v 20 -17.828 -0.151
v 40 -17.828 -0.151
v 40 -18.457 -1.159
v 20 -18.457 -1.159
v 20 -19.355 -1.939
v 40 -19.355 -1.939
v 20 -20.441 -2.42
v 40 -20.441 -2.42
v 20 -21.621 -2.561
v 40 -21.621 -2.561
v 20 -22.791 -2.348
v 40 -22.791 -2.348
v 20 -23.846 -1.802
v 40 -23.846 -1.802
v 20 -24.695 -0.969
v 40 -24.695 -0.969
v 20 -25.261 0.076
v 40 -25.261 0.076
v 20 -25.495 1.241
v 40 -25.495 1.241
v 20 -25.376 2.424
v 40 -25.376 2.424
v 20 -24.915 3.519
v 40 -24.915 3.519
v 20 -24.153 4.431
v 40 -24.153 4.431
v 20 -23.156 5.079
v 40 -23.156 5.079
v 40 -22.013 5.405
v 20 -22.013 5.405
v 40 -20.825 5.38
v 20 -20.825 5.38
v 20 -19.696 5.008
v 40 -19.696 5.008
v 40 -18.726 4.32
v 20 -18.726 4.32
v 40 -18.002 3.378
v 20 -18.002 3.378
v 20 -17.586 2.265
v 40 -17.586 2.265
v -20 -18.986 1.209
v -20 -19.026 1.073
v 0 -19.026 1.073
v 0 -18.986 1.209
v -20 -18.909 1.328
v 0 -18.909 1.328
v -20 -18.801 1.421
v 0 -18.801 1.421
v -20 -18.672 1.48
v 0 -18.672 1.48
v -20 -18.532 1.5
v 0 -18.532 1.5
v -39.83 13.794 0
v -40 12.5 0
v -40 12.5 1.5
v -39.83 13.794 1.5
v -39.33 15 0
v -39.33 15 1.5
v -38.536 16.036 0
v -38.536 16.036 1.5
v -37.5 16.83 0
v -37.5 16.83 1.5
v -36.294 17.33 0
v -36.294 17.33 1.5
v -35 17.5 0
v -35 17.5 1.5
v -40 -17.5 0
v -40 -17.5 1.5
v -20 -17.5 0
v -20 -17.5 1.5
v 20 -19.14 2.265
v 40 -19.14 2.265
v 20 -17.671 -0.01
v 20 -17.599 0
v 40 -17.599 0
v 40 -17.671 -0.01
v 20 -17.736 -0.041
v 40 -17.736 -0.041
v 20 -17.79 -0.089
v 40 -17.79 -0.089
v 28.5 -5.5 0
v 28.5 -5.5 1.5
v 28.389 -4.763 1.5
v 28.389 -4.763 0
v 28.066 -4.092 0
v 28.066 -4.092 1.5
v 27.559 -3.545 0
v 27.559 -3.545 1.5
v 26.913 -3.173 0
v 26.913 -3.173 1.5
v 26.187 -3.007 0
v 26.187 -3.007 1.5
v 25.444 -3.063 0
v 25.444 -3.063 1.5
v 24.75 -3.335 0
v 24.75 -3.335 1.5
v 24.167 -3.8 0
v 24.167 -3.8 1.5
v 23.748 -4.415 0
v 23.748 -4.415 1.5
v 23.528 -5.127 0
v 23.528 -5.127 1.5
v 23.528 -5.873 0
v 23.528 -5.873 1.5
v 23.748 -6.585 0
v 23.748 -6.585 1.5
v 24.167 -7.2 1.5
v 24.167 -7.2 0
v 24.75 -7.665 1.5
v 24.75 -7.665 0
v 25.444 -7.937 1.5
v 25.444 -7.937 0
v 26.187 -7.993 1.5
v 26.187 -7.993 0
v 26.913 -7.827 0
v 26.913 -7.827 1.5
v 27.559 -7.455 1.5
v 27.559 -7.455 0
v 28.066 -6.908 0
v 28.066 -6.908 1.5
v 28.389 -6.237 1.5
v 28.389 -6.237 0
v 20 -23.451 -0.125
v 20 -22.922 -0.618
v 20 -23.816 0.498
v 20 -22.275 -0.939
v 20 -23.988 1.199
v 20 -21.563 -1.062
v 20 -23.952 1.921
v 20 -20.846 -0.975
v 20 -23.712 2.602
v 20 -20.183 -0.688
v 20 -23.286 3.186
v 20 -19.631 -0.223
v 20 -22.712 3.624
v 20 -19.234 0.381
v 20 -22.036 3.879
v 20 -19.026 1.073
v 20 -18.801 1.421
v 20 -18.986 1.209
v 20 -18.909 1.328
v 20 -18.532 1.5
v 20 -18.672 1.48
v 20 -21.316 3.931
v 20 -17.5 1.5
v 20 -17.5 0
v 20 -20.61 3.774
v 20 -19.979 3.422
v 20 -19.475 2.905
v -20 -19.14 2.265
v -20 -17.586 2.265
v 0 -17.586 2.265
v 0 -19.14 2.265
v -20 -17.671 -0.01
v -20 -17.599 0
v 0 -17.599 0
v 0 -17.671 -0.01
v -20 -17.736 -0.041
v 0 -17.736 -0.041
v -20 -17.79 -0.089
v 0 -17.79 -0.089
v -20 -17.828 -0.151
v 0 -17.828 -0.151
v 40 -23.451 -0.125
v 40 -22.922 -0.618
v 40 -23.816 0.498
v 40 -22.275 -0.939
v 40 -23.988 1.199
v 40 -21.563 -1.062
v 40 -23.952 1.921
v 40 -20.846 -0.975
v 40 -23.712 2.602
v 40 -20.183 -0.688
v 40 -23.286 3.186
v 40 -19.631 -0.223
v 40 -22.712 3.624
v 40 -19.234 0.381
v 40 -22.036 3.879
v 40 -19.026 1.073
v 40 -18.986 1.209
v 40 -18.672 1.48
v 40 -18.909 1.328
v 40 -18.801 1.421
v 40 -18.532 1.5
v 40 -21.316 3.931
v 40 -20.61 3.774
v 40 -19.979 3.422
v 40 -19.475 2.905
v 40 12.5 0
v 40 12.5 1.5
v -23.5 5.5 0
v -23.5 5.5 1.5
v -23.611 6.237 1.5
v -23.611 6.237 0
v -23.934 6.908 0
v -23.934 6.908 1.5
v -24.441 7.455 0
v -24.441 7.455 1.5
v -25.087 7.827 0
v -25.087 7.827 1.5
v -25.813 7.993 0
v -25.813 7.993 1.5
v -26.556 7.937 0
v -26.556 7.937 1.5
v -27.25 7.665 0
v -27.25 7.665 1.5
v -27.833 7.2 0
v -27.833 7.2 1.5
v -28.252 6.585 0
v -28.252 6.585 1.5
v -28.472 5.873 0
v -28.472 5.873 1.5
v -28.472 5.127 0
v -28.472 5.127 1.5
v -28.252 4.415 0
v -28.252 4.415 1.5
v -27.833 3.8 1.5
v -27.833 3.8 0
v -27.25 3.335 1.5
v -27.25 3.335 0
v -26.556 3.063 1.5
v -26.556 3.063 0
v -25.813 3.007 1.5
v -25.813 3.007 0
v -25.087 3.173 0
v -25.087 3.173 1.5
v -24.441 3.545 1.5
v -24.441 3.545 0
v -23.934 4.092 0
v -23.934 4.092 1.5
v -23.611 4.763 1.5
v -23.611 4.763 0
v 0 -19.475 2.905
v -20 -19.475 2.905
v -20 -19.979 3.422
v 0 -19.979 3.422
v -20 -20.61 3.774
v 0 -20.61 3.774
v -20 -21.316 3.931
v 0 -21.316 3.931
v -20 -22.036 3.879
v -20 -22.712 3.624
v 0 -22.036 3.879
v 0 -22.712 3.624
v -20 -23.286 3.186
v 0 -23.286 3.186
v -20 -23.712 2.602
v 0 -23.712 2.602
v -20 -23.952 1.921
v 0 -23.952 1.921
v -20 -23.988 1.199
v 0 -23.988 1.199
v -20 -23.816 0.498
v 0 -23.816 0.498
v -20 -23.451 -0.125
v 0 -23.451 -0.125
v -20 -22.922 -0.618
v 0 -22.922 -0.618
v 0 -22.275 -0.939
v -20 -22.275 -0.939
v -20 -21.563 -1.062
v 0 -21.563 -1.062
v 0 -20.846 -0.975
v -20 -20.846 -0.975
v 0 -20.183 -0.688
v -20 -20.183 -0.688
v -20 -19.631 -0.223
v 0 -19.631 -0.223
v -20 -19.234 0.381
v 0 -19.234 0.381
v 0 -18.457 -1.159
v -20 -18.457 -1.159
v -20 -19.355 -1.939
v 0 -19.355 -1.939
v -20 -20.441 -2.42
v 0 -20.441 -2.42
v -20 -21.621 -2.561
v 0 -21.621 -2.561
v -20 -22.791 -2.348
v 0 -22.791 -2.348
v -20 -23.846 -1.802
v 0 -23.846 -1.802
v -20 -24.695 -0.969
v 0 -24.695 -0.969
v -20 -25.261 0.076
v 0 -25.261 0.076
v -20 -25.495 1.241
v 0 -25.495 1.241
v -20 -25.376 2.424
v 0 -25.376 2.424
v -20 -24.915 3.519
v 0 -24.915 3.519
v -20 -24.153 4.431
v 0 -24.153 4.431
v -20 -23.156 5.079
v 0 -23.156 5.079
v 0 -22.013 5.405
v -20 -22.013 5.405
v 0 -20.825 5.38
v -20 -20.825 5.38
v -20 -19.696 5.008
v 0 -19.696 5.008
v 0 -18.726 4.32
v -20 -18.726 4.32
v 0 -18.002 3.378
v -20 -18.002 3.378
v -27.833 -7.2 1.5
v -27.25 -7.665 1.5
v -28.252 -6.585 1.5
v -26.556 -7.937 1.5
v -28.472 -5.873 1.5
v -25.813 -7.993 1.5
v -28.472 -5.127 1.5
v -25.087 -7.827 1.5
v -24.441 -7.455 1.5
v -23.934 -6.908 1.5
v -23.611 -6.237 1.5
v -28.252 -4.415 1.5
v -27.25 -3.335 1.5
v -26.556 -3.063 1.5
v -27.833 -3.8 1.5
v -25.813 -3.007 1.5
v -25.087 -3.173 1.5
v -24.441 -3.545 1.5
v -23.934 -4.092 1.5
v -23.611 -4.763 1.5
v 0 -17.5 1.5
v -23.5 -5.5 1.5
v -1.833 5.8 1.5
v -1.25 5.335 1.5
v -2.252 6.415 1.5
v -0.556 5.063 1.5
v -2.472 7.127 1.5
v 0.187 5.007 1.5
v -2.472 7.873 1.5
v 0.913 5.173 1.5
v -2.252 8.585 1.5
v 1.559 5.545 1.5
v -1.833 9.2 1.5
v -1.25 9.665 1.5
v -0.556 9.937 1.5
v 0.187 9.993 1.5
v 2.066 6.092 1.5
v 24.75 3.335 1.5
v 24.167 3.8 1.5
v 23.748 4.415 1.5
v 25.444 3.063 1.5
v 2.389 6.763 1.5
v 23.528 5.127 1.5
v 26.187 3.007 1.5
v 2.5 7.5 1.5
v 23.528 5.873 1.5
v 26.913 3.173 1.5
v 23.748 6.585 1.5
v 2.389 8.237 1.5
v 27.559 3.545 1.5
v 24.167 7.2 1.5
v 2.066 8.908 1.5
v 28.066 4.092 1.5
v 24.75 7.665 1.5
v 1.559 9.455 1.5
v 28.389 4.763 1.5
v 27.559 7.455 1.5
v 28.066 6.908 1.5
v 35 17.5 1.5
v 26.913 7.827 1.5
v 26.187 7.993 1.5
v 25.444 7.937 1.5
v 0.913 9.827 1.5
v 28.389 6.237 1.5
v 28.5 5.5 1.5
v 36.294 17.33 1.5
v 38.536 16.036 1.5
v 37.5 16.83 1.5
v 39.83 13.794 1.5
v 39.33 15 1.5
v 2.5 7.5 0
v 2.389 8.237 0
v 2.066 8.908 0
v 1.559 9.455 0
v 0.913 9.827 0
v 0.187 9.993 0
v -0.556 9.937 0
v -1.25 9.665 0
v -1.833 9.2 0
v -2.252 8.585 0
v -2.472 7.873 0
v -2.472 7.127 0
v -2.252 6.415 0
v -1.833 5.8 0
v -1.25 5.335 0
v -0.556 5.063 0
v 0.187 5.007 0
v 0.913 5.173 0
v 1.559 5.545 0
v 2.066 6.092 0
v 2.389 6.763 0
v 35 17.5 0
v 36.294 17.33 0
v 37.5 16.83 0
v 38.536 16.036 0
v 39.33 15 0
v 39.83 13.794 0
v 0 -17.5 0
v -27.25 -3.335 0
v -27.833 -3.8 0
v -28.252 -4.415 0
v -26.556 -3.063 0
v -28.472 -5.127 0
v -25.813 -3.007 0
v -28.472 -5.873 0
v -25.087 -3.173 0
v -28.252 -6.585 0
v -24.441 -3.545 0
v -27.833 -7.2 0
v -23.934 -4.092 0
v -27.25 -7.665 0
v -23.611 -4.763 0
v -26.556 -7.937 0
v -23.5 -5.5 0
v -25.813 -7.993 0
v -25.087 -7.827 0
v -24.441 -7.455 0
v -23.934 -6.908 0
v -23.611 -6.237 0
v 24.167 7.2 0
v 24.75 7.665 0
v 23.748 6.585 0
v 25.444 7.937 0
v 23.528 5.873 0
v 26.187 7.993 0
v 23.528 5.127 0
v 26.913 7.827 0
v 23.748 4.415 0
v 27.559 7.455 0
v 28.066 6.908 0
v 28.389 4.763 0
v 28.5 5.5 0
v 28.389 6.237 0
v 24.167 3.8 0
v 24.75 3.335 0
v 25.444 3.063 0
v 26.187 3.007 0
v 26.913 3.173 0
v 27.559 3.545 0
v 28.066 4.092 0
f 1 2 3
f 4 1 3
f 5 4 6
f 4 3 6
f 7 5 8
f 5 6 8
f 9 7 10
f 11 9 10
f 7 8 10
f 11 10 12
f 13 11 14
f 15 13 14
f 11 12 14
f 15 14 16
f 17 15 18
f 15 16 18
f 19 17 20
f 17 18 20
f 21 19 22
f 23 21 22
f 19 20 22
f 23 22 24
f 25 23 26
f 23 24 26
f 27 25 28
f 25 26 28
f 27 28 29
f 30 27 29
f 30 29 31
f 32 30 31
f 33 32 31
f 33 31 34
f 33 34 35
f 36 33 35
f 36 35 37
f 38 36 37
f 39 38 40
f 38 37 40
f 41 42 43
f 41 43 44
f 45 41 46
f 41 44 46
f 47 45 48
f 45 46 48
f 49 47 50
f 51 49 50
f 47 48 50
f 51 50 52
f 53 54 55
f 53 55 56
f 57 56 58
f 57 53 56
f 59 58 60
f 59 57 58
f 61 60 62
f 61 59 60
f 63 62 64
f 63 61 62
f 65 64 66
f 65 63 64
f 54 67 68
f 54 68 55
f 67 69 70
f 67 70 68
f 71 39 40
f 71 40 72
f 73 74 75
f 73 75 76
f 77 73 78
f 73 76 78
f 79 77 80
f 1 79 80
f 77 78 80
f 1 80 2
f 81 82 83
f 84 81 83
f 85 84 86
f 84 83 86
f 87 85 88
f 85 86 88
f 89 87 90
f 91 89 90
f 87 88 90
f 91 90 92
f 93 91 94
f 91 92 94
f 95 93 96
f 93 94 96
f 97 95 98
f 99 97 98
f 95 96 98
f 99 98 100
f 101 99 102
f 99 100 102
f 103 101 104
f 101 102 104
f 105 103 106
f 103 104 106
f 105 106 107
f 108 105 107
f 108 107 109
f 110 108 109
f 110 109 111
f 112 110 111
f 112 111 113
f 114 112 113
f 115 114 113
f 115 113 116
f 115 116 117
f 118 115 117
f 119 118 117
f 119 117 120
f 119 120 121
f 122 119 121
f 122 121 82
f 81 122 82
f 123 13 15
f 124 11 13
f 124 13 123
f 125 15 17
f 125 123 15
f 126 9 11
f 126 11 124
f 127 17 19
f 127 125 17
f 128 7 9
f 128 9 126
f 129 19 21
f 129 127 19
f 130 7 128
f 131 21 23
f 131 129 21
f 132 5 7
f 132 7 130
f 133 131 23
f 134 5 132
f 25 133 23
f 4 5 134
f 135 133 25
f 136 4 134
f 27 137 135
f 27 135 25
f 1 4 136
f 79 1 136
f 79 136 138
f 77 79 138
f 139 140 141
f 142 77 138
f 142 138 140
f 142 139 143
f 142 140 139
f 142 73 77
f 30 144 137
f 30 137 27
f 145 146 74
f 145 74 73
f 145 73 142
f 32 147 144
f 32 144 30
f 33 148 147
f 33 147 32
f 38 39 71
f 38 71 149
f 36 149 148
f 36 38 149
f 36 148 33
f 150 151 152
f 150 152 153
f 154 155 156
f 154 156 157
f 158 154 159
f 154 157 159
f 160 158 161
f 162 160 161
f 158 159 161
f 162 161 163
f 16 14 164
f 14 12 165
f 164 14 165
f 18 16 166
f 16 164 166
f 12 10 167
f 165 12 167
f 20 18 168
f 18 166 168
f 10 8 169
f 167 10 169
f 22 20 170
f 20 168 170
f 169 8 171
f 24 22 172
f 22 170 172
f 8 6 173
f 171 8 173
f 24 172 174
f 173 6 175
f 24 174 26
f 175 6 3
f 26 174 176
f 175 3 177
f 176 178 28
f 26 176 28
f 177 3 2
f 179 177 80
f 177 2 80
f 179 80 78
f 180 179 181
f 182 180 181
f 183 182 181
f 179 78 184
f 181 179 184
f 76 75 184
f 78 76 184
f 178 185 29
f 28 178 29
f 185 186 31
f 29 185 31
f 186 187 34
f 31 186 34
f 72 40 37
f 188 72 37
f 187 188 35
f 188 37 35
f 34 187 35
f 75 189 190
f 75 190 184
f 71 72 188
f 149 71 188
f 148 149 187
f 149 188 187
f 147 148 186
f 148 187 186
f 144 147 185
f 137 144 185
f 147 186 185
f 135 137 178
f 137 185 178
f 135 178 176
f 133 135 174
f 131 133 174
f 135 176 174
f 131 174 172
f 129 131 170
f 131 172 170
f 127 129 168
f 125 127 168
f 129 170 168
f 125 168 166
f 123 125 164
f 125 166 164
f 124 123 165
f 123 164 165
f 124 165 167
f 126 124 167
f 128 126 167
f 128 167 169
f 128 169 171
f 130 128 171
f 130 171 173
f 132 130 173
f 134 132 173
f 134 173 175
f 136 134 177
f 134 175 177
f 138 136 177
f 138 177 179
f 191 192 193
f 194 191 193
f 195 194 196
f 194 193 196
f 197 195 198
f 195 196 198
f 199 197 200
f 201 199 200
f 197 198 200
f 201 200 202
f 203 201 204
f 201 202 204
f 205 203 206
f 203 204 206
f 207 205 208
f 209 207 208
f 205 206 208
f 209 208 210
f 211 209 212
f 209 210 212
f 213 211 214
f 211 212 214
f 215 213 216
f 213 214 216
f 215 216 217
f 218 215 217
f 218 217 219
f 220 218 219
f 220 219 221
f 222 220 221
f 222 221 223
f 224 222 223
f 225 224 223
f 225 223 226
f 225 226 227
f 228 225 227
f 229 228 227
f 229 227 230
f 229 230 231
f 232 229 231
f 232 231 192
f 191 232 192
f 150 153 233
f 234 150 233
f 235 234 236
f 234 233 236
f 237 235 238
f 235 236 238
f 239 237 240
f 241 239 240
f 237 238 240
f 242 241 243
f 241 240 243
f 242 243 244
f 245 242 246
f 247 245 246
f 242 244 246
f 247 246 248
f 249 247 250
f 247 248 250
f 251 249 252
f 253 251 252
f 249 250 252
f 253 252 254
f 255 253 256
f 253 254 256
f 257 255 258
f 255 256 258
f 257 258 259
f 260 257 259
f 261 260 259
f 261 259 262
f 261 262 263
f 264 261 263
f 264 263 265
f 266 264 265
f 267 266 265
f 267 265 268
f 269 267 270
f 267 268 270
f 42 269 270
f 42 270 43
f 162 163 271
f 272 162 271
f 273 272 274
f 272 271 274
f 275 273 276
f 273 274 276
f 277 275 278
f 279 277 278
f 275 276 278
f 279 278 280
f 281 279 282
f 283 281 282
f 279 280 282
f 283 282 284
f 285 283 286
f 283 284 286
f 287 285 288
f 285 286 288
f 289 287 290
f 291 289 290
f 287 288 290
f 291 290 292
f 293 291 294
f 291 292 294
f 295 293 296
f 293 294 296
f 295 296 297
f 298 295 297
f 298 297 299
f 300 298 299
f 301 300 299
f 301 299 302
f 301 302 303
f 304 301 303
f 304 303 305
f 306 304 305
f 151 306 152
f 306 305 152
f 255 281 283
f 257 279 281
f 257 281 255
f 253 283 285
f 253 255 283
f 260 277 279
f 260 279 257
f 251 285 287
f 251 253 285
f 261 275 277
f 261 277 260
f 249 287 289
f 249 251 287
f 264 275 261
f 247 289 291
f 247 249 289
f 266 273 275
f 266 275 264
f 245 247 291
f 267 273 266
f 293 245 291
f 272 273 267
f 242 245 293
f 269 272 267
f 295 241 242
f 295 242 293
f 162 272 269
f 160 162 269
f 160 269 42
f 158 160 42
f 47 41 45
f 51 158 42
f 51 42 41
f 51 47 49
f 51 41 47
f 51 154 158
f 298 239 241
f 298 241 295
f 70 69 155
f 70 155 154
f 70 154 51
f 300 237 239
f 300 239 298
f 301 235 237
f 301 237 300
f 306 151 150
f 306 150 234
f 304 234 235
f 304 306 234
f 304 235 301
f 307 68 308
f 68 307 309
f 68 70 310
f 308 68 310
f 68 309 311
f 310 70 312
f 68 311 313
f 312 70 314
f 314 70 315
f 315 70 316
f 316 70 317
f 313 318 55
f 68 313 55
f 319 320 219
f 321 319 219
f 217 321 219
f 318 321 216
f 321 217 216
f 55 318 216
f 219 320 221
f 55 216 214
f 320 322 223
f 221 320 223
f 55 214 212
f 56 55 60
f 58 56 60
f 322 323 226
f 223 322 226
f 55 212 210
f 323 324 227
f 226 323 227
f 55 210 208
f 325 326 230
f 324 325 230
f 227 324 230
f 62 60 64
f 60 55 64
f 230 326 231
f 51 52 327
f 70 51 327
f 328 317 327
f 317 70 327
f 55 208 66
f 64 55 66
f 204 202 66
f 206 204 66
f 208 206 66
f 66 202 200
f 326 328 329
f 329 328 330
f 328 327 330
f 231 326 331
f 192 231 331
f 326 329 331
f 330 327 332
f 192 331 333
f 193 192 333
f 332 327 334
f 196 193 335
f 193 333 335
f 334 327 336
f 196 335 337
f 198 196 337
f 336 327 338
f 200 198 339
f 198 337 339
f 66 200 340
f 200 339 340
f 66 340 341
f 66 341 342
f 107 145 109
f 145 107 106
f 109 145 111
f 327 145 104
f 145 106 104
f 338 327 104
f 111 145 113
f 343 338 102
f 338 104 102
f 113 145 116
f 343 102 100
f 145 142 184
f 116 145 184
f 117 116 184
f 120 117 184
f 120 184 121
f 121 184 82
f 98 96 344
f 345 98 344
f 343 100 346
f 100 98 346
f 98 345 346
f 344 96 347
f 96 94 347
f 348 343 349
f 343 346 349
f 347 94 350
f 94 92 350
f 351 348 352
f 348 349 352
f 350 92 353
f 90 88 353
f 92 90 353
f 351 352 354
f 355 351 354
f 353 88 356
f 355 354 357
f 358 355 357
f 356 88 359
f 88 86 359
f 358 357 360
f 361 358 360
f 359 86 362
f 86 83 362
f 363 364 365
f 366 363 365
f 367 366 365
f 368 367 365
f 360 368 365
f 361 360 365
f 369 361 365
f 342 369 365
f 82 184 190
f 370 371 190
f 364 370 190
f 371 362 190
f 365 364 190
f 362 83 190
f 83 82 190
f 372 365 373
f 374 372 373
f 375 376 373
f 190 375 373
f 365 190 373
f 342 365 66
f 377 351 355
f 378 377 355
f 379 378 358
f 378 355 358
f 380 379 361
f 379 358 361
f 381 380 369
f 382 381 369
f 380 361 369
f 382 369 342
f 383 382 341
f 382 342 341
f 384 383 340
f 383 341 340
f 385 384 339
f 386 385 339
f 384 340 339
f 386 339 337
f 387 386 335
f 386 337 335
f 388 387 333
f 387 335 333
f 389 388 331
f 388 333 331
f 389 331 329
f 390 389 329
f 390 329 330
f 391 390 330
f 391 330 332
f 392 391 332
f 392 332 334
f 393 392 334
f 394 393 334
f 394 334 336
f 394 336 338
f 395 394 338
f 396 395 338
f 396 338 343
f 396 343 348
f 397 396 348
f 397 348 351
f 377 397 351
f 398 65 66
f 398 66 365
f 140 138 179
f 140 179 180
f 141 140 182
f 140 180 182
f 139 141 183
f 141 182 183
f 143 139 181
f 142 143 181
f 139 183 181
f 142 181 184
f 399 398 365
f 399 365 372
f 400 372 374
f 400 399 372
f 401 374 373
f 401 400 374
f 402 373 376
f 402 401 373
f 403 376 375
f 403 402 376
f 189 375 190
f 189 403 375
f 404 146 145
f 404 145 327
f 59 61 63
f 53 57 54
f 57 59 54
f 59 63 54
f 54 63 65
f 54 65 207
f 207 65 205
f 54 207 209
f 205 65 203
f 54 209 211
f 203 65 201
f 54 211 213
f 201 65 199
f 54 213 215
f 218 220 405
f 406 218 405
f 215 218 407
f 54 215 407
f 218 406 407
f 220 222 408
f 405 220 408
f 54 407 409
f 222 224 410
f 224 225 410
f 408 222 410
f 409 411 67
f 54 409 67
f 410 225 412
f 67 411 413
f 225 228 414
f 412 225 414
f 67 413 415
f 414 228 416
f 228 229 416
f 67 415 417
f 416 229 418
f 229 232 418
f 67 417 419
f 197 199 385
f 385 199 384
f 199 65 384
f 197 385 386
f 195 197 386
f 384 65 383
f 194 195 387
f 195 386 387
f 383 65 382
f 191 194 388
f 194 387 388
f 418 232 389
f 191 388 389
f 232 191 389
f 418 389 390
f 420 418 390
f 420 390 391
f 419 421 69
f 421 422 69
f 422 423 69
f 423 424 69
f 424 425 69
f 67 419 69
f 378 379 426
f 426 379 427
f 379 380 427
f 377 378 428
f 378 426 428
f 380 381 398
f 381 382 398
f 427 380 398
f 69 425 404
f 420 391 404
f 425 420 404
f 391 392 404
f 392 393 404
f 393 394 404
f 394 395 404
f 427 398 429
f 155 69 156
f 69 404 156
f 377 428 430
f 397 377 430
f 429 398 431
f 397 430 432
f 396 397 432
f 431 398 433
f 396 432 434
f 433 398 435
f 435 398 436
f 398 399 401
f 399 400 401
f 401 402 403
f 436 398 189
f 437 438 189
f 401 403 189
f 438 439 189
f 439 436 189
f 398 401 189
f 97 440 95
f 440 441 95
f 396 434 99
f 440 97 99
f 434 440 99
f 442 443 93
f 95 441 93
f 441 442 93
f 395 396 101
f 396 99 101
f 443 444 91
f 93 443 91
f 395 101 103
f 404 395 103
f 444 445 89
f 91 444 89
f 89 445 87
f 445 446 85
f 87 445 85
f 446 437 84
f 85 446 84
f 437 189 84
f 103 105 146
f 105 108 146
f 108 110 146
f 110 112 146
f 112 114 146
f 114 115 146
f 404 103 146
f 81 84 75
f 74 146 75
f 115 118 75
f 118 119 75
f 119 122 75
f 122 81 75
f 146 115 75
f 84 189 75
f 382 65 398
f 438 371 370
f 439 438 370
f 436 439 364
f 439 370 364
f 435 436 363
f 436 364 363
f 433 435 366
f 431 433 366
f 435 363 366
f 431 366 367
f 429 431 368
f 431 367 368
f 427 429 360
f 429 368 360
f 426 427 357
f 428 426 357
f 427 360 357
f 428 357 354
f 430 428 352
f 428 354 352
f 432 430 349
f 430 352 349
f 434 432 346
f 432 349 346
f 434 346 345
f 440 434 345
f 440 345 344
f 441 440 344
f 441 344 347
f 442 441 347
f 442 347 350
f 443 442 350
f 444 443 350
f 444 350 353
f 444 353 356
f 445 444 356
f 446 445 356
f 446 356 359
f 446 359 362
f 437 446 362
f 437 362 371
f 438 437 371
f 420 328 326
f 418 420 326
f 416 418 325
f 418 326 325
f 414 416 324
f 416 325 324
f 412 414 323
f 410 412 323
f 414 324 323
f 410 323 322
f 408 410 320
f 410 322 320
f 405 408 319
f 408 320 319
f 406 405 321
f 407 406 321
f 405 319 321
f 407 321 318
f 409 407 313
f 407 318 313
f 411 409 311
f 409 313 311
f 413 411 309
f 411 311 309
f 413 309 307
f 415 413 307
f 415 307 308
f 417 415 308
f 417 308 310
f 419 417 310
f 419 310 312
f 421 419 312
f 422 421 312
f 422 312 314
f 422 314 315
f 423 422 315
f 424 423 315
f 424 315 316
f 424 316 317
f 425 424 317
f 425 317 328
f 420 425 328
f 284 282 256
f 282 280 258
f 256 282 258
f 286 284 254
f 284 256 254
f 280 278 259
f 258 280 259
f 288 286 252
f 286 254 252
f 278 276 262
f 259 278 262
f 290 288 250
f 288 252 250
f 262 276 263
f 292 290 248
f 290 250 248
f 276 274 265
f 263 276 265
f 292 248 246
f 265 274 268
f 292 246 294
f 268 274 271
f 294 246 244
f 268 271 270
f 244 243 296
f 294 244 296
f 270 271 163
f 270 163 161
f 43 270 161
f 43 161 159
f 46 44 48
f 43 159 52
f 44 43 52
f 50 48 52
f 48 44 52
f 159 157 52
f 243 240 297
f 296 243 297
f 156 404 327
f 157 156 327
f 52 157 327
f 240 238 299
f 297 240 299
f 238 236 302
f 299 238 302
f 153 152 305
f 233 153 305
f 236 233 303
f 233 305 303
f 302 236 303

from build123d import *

# Parameters (mm, degrees)
BOSS_EXTRUDE1_DEPTH = 1.5
BOSS_EXTRUDE3_DEPTH = 20
LPATTERN1_COUNT     = 2
LPATTERN1_PITCH     = 40
SKETCH7_R           = 2.5
CUT_EXTRUDE1_DEPTH  = 48.610167833
SKETCH8_R           = 2.5
CUT_EXTRUDE2_DEPTH  = 48.610167833


with BuildPart() as part:
    # Sketch2 → Boss-Extrude1 (new body)
    with BuildSketch(Plane.XY):
        with BuildLine():
            Line((40, -17.5), (-40, -17.5))
            Line((-40, -17.5), (-40, 12.5))
            ThreePointArc((-40, 12.5), (-38.535533906, 16.035533906), (-35, 17.5))
            Line((-35, 17.5), (35, 17.5))
            ThreePointArc((35, 17.5), (38.535533906, 16.035533906), (40, 12.5))
            Line((40, 12.5), (40, -17.5))
        make_face()
    extrude(amount=BOSS_EXTRUDE1_DEPTH)

    # Sketch6 → Boss-Extrude3 (add)
    with BuildSketch(Plane(origin=(40, 0, 0), x_dir=(0, 0, -1), z_dir=(1, 0, 0))):
        with BuildLine():
            Line((-2.264835489, -17.585982761), (-2.264835489, -19.140334974))
            ThreePointArc((-2.264835489, -19.140334974), (-1.199434521, -23.988140772), (-1.072937624, -19.026256169))
            ThreePointArc((-1.072937624, -19.026256169), (-1.378463216, -18.858354721), (-1.5, -18.531604672))
            Line((-1.5, -18.531604672), (-1.5, -17.5))
            Line((-1.5, -17.5), (0, -17.5))
            Line((0, -17.5), (0, -17.598947109))
            ThreePointArc((0, -17.598947109), (0.041052608, -17.736209584), (0.150727898, -17.8283922))
            ThreePointArc((0.150727898, -17.8283922), (-1.837032289, -25.479523), (-2.264835489, -17.585982761))
        make_face()
    boss_extrude3 = extrude(amount=-BOSS_EXTRUDE3_DEPTH)

    # LPattern1: Boss-Extrude3 ×2
    with Locations(*[(-i * LPATTERN1_PITCH, 0, 0) for i in range(1, LPATTERN1_COUNT)]):
        add(boss_extrude3)

    # Sketch7 → Cut-Extrude1 (cut, through all)
    with BuildSketch(Plane.XY.offset(1.5)):
        with Locations((0, 7.5)):
            Circle(SKETCH7_R)
        with Locations((-26, -5.5)):
            Circle(SKETCH7_R)
        with Locations((26, -5.5)):
            Circle(SKETCH7_R)
    extrude(amount=-CUT_EXTRUDE1_DEPTH, mode=Mode.SUBTRACT)

    # Sketch8 → Cut-Extrude2 (cut, through all)
    with BuildSketch(Plane.XY.offset(1.5)):
        with Locations((-26, 5.5)):
            Circle(SKETCH8_R)
        with Locations((26, 5.5)):
            Circle(SKETCH8_R)
    extrude(amount=-CUT_EXTRUDE2_DEPTH, mode=Mode.SUBTRACT)


solid = part.part
